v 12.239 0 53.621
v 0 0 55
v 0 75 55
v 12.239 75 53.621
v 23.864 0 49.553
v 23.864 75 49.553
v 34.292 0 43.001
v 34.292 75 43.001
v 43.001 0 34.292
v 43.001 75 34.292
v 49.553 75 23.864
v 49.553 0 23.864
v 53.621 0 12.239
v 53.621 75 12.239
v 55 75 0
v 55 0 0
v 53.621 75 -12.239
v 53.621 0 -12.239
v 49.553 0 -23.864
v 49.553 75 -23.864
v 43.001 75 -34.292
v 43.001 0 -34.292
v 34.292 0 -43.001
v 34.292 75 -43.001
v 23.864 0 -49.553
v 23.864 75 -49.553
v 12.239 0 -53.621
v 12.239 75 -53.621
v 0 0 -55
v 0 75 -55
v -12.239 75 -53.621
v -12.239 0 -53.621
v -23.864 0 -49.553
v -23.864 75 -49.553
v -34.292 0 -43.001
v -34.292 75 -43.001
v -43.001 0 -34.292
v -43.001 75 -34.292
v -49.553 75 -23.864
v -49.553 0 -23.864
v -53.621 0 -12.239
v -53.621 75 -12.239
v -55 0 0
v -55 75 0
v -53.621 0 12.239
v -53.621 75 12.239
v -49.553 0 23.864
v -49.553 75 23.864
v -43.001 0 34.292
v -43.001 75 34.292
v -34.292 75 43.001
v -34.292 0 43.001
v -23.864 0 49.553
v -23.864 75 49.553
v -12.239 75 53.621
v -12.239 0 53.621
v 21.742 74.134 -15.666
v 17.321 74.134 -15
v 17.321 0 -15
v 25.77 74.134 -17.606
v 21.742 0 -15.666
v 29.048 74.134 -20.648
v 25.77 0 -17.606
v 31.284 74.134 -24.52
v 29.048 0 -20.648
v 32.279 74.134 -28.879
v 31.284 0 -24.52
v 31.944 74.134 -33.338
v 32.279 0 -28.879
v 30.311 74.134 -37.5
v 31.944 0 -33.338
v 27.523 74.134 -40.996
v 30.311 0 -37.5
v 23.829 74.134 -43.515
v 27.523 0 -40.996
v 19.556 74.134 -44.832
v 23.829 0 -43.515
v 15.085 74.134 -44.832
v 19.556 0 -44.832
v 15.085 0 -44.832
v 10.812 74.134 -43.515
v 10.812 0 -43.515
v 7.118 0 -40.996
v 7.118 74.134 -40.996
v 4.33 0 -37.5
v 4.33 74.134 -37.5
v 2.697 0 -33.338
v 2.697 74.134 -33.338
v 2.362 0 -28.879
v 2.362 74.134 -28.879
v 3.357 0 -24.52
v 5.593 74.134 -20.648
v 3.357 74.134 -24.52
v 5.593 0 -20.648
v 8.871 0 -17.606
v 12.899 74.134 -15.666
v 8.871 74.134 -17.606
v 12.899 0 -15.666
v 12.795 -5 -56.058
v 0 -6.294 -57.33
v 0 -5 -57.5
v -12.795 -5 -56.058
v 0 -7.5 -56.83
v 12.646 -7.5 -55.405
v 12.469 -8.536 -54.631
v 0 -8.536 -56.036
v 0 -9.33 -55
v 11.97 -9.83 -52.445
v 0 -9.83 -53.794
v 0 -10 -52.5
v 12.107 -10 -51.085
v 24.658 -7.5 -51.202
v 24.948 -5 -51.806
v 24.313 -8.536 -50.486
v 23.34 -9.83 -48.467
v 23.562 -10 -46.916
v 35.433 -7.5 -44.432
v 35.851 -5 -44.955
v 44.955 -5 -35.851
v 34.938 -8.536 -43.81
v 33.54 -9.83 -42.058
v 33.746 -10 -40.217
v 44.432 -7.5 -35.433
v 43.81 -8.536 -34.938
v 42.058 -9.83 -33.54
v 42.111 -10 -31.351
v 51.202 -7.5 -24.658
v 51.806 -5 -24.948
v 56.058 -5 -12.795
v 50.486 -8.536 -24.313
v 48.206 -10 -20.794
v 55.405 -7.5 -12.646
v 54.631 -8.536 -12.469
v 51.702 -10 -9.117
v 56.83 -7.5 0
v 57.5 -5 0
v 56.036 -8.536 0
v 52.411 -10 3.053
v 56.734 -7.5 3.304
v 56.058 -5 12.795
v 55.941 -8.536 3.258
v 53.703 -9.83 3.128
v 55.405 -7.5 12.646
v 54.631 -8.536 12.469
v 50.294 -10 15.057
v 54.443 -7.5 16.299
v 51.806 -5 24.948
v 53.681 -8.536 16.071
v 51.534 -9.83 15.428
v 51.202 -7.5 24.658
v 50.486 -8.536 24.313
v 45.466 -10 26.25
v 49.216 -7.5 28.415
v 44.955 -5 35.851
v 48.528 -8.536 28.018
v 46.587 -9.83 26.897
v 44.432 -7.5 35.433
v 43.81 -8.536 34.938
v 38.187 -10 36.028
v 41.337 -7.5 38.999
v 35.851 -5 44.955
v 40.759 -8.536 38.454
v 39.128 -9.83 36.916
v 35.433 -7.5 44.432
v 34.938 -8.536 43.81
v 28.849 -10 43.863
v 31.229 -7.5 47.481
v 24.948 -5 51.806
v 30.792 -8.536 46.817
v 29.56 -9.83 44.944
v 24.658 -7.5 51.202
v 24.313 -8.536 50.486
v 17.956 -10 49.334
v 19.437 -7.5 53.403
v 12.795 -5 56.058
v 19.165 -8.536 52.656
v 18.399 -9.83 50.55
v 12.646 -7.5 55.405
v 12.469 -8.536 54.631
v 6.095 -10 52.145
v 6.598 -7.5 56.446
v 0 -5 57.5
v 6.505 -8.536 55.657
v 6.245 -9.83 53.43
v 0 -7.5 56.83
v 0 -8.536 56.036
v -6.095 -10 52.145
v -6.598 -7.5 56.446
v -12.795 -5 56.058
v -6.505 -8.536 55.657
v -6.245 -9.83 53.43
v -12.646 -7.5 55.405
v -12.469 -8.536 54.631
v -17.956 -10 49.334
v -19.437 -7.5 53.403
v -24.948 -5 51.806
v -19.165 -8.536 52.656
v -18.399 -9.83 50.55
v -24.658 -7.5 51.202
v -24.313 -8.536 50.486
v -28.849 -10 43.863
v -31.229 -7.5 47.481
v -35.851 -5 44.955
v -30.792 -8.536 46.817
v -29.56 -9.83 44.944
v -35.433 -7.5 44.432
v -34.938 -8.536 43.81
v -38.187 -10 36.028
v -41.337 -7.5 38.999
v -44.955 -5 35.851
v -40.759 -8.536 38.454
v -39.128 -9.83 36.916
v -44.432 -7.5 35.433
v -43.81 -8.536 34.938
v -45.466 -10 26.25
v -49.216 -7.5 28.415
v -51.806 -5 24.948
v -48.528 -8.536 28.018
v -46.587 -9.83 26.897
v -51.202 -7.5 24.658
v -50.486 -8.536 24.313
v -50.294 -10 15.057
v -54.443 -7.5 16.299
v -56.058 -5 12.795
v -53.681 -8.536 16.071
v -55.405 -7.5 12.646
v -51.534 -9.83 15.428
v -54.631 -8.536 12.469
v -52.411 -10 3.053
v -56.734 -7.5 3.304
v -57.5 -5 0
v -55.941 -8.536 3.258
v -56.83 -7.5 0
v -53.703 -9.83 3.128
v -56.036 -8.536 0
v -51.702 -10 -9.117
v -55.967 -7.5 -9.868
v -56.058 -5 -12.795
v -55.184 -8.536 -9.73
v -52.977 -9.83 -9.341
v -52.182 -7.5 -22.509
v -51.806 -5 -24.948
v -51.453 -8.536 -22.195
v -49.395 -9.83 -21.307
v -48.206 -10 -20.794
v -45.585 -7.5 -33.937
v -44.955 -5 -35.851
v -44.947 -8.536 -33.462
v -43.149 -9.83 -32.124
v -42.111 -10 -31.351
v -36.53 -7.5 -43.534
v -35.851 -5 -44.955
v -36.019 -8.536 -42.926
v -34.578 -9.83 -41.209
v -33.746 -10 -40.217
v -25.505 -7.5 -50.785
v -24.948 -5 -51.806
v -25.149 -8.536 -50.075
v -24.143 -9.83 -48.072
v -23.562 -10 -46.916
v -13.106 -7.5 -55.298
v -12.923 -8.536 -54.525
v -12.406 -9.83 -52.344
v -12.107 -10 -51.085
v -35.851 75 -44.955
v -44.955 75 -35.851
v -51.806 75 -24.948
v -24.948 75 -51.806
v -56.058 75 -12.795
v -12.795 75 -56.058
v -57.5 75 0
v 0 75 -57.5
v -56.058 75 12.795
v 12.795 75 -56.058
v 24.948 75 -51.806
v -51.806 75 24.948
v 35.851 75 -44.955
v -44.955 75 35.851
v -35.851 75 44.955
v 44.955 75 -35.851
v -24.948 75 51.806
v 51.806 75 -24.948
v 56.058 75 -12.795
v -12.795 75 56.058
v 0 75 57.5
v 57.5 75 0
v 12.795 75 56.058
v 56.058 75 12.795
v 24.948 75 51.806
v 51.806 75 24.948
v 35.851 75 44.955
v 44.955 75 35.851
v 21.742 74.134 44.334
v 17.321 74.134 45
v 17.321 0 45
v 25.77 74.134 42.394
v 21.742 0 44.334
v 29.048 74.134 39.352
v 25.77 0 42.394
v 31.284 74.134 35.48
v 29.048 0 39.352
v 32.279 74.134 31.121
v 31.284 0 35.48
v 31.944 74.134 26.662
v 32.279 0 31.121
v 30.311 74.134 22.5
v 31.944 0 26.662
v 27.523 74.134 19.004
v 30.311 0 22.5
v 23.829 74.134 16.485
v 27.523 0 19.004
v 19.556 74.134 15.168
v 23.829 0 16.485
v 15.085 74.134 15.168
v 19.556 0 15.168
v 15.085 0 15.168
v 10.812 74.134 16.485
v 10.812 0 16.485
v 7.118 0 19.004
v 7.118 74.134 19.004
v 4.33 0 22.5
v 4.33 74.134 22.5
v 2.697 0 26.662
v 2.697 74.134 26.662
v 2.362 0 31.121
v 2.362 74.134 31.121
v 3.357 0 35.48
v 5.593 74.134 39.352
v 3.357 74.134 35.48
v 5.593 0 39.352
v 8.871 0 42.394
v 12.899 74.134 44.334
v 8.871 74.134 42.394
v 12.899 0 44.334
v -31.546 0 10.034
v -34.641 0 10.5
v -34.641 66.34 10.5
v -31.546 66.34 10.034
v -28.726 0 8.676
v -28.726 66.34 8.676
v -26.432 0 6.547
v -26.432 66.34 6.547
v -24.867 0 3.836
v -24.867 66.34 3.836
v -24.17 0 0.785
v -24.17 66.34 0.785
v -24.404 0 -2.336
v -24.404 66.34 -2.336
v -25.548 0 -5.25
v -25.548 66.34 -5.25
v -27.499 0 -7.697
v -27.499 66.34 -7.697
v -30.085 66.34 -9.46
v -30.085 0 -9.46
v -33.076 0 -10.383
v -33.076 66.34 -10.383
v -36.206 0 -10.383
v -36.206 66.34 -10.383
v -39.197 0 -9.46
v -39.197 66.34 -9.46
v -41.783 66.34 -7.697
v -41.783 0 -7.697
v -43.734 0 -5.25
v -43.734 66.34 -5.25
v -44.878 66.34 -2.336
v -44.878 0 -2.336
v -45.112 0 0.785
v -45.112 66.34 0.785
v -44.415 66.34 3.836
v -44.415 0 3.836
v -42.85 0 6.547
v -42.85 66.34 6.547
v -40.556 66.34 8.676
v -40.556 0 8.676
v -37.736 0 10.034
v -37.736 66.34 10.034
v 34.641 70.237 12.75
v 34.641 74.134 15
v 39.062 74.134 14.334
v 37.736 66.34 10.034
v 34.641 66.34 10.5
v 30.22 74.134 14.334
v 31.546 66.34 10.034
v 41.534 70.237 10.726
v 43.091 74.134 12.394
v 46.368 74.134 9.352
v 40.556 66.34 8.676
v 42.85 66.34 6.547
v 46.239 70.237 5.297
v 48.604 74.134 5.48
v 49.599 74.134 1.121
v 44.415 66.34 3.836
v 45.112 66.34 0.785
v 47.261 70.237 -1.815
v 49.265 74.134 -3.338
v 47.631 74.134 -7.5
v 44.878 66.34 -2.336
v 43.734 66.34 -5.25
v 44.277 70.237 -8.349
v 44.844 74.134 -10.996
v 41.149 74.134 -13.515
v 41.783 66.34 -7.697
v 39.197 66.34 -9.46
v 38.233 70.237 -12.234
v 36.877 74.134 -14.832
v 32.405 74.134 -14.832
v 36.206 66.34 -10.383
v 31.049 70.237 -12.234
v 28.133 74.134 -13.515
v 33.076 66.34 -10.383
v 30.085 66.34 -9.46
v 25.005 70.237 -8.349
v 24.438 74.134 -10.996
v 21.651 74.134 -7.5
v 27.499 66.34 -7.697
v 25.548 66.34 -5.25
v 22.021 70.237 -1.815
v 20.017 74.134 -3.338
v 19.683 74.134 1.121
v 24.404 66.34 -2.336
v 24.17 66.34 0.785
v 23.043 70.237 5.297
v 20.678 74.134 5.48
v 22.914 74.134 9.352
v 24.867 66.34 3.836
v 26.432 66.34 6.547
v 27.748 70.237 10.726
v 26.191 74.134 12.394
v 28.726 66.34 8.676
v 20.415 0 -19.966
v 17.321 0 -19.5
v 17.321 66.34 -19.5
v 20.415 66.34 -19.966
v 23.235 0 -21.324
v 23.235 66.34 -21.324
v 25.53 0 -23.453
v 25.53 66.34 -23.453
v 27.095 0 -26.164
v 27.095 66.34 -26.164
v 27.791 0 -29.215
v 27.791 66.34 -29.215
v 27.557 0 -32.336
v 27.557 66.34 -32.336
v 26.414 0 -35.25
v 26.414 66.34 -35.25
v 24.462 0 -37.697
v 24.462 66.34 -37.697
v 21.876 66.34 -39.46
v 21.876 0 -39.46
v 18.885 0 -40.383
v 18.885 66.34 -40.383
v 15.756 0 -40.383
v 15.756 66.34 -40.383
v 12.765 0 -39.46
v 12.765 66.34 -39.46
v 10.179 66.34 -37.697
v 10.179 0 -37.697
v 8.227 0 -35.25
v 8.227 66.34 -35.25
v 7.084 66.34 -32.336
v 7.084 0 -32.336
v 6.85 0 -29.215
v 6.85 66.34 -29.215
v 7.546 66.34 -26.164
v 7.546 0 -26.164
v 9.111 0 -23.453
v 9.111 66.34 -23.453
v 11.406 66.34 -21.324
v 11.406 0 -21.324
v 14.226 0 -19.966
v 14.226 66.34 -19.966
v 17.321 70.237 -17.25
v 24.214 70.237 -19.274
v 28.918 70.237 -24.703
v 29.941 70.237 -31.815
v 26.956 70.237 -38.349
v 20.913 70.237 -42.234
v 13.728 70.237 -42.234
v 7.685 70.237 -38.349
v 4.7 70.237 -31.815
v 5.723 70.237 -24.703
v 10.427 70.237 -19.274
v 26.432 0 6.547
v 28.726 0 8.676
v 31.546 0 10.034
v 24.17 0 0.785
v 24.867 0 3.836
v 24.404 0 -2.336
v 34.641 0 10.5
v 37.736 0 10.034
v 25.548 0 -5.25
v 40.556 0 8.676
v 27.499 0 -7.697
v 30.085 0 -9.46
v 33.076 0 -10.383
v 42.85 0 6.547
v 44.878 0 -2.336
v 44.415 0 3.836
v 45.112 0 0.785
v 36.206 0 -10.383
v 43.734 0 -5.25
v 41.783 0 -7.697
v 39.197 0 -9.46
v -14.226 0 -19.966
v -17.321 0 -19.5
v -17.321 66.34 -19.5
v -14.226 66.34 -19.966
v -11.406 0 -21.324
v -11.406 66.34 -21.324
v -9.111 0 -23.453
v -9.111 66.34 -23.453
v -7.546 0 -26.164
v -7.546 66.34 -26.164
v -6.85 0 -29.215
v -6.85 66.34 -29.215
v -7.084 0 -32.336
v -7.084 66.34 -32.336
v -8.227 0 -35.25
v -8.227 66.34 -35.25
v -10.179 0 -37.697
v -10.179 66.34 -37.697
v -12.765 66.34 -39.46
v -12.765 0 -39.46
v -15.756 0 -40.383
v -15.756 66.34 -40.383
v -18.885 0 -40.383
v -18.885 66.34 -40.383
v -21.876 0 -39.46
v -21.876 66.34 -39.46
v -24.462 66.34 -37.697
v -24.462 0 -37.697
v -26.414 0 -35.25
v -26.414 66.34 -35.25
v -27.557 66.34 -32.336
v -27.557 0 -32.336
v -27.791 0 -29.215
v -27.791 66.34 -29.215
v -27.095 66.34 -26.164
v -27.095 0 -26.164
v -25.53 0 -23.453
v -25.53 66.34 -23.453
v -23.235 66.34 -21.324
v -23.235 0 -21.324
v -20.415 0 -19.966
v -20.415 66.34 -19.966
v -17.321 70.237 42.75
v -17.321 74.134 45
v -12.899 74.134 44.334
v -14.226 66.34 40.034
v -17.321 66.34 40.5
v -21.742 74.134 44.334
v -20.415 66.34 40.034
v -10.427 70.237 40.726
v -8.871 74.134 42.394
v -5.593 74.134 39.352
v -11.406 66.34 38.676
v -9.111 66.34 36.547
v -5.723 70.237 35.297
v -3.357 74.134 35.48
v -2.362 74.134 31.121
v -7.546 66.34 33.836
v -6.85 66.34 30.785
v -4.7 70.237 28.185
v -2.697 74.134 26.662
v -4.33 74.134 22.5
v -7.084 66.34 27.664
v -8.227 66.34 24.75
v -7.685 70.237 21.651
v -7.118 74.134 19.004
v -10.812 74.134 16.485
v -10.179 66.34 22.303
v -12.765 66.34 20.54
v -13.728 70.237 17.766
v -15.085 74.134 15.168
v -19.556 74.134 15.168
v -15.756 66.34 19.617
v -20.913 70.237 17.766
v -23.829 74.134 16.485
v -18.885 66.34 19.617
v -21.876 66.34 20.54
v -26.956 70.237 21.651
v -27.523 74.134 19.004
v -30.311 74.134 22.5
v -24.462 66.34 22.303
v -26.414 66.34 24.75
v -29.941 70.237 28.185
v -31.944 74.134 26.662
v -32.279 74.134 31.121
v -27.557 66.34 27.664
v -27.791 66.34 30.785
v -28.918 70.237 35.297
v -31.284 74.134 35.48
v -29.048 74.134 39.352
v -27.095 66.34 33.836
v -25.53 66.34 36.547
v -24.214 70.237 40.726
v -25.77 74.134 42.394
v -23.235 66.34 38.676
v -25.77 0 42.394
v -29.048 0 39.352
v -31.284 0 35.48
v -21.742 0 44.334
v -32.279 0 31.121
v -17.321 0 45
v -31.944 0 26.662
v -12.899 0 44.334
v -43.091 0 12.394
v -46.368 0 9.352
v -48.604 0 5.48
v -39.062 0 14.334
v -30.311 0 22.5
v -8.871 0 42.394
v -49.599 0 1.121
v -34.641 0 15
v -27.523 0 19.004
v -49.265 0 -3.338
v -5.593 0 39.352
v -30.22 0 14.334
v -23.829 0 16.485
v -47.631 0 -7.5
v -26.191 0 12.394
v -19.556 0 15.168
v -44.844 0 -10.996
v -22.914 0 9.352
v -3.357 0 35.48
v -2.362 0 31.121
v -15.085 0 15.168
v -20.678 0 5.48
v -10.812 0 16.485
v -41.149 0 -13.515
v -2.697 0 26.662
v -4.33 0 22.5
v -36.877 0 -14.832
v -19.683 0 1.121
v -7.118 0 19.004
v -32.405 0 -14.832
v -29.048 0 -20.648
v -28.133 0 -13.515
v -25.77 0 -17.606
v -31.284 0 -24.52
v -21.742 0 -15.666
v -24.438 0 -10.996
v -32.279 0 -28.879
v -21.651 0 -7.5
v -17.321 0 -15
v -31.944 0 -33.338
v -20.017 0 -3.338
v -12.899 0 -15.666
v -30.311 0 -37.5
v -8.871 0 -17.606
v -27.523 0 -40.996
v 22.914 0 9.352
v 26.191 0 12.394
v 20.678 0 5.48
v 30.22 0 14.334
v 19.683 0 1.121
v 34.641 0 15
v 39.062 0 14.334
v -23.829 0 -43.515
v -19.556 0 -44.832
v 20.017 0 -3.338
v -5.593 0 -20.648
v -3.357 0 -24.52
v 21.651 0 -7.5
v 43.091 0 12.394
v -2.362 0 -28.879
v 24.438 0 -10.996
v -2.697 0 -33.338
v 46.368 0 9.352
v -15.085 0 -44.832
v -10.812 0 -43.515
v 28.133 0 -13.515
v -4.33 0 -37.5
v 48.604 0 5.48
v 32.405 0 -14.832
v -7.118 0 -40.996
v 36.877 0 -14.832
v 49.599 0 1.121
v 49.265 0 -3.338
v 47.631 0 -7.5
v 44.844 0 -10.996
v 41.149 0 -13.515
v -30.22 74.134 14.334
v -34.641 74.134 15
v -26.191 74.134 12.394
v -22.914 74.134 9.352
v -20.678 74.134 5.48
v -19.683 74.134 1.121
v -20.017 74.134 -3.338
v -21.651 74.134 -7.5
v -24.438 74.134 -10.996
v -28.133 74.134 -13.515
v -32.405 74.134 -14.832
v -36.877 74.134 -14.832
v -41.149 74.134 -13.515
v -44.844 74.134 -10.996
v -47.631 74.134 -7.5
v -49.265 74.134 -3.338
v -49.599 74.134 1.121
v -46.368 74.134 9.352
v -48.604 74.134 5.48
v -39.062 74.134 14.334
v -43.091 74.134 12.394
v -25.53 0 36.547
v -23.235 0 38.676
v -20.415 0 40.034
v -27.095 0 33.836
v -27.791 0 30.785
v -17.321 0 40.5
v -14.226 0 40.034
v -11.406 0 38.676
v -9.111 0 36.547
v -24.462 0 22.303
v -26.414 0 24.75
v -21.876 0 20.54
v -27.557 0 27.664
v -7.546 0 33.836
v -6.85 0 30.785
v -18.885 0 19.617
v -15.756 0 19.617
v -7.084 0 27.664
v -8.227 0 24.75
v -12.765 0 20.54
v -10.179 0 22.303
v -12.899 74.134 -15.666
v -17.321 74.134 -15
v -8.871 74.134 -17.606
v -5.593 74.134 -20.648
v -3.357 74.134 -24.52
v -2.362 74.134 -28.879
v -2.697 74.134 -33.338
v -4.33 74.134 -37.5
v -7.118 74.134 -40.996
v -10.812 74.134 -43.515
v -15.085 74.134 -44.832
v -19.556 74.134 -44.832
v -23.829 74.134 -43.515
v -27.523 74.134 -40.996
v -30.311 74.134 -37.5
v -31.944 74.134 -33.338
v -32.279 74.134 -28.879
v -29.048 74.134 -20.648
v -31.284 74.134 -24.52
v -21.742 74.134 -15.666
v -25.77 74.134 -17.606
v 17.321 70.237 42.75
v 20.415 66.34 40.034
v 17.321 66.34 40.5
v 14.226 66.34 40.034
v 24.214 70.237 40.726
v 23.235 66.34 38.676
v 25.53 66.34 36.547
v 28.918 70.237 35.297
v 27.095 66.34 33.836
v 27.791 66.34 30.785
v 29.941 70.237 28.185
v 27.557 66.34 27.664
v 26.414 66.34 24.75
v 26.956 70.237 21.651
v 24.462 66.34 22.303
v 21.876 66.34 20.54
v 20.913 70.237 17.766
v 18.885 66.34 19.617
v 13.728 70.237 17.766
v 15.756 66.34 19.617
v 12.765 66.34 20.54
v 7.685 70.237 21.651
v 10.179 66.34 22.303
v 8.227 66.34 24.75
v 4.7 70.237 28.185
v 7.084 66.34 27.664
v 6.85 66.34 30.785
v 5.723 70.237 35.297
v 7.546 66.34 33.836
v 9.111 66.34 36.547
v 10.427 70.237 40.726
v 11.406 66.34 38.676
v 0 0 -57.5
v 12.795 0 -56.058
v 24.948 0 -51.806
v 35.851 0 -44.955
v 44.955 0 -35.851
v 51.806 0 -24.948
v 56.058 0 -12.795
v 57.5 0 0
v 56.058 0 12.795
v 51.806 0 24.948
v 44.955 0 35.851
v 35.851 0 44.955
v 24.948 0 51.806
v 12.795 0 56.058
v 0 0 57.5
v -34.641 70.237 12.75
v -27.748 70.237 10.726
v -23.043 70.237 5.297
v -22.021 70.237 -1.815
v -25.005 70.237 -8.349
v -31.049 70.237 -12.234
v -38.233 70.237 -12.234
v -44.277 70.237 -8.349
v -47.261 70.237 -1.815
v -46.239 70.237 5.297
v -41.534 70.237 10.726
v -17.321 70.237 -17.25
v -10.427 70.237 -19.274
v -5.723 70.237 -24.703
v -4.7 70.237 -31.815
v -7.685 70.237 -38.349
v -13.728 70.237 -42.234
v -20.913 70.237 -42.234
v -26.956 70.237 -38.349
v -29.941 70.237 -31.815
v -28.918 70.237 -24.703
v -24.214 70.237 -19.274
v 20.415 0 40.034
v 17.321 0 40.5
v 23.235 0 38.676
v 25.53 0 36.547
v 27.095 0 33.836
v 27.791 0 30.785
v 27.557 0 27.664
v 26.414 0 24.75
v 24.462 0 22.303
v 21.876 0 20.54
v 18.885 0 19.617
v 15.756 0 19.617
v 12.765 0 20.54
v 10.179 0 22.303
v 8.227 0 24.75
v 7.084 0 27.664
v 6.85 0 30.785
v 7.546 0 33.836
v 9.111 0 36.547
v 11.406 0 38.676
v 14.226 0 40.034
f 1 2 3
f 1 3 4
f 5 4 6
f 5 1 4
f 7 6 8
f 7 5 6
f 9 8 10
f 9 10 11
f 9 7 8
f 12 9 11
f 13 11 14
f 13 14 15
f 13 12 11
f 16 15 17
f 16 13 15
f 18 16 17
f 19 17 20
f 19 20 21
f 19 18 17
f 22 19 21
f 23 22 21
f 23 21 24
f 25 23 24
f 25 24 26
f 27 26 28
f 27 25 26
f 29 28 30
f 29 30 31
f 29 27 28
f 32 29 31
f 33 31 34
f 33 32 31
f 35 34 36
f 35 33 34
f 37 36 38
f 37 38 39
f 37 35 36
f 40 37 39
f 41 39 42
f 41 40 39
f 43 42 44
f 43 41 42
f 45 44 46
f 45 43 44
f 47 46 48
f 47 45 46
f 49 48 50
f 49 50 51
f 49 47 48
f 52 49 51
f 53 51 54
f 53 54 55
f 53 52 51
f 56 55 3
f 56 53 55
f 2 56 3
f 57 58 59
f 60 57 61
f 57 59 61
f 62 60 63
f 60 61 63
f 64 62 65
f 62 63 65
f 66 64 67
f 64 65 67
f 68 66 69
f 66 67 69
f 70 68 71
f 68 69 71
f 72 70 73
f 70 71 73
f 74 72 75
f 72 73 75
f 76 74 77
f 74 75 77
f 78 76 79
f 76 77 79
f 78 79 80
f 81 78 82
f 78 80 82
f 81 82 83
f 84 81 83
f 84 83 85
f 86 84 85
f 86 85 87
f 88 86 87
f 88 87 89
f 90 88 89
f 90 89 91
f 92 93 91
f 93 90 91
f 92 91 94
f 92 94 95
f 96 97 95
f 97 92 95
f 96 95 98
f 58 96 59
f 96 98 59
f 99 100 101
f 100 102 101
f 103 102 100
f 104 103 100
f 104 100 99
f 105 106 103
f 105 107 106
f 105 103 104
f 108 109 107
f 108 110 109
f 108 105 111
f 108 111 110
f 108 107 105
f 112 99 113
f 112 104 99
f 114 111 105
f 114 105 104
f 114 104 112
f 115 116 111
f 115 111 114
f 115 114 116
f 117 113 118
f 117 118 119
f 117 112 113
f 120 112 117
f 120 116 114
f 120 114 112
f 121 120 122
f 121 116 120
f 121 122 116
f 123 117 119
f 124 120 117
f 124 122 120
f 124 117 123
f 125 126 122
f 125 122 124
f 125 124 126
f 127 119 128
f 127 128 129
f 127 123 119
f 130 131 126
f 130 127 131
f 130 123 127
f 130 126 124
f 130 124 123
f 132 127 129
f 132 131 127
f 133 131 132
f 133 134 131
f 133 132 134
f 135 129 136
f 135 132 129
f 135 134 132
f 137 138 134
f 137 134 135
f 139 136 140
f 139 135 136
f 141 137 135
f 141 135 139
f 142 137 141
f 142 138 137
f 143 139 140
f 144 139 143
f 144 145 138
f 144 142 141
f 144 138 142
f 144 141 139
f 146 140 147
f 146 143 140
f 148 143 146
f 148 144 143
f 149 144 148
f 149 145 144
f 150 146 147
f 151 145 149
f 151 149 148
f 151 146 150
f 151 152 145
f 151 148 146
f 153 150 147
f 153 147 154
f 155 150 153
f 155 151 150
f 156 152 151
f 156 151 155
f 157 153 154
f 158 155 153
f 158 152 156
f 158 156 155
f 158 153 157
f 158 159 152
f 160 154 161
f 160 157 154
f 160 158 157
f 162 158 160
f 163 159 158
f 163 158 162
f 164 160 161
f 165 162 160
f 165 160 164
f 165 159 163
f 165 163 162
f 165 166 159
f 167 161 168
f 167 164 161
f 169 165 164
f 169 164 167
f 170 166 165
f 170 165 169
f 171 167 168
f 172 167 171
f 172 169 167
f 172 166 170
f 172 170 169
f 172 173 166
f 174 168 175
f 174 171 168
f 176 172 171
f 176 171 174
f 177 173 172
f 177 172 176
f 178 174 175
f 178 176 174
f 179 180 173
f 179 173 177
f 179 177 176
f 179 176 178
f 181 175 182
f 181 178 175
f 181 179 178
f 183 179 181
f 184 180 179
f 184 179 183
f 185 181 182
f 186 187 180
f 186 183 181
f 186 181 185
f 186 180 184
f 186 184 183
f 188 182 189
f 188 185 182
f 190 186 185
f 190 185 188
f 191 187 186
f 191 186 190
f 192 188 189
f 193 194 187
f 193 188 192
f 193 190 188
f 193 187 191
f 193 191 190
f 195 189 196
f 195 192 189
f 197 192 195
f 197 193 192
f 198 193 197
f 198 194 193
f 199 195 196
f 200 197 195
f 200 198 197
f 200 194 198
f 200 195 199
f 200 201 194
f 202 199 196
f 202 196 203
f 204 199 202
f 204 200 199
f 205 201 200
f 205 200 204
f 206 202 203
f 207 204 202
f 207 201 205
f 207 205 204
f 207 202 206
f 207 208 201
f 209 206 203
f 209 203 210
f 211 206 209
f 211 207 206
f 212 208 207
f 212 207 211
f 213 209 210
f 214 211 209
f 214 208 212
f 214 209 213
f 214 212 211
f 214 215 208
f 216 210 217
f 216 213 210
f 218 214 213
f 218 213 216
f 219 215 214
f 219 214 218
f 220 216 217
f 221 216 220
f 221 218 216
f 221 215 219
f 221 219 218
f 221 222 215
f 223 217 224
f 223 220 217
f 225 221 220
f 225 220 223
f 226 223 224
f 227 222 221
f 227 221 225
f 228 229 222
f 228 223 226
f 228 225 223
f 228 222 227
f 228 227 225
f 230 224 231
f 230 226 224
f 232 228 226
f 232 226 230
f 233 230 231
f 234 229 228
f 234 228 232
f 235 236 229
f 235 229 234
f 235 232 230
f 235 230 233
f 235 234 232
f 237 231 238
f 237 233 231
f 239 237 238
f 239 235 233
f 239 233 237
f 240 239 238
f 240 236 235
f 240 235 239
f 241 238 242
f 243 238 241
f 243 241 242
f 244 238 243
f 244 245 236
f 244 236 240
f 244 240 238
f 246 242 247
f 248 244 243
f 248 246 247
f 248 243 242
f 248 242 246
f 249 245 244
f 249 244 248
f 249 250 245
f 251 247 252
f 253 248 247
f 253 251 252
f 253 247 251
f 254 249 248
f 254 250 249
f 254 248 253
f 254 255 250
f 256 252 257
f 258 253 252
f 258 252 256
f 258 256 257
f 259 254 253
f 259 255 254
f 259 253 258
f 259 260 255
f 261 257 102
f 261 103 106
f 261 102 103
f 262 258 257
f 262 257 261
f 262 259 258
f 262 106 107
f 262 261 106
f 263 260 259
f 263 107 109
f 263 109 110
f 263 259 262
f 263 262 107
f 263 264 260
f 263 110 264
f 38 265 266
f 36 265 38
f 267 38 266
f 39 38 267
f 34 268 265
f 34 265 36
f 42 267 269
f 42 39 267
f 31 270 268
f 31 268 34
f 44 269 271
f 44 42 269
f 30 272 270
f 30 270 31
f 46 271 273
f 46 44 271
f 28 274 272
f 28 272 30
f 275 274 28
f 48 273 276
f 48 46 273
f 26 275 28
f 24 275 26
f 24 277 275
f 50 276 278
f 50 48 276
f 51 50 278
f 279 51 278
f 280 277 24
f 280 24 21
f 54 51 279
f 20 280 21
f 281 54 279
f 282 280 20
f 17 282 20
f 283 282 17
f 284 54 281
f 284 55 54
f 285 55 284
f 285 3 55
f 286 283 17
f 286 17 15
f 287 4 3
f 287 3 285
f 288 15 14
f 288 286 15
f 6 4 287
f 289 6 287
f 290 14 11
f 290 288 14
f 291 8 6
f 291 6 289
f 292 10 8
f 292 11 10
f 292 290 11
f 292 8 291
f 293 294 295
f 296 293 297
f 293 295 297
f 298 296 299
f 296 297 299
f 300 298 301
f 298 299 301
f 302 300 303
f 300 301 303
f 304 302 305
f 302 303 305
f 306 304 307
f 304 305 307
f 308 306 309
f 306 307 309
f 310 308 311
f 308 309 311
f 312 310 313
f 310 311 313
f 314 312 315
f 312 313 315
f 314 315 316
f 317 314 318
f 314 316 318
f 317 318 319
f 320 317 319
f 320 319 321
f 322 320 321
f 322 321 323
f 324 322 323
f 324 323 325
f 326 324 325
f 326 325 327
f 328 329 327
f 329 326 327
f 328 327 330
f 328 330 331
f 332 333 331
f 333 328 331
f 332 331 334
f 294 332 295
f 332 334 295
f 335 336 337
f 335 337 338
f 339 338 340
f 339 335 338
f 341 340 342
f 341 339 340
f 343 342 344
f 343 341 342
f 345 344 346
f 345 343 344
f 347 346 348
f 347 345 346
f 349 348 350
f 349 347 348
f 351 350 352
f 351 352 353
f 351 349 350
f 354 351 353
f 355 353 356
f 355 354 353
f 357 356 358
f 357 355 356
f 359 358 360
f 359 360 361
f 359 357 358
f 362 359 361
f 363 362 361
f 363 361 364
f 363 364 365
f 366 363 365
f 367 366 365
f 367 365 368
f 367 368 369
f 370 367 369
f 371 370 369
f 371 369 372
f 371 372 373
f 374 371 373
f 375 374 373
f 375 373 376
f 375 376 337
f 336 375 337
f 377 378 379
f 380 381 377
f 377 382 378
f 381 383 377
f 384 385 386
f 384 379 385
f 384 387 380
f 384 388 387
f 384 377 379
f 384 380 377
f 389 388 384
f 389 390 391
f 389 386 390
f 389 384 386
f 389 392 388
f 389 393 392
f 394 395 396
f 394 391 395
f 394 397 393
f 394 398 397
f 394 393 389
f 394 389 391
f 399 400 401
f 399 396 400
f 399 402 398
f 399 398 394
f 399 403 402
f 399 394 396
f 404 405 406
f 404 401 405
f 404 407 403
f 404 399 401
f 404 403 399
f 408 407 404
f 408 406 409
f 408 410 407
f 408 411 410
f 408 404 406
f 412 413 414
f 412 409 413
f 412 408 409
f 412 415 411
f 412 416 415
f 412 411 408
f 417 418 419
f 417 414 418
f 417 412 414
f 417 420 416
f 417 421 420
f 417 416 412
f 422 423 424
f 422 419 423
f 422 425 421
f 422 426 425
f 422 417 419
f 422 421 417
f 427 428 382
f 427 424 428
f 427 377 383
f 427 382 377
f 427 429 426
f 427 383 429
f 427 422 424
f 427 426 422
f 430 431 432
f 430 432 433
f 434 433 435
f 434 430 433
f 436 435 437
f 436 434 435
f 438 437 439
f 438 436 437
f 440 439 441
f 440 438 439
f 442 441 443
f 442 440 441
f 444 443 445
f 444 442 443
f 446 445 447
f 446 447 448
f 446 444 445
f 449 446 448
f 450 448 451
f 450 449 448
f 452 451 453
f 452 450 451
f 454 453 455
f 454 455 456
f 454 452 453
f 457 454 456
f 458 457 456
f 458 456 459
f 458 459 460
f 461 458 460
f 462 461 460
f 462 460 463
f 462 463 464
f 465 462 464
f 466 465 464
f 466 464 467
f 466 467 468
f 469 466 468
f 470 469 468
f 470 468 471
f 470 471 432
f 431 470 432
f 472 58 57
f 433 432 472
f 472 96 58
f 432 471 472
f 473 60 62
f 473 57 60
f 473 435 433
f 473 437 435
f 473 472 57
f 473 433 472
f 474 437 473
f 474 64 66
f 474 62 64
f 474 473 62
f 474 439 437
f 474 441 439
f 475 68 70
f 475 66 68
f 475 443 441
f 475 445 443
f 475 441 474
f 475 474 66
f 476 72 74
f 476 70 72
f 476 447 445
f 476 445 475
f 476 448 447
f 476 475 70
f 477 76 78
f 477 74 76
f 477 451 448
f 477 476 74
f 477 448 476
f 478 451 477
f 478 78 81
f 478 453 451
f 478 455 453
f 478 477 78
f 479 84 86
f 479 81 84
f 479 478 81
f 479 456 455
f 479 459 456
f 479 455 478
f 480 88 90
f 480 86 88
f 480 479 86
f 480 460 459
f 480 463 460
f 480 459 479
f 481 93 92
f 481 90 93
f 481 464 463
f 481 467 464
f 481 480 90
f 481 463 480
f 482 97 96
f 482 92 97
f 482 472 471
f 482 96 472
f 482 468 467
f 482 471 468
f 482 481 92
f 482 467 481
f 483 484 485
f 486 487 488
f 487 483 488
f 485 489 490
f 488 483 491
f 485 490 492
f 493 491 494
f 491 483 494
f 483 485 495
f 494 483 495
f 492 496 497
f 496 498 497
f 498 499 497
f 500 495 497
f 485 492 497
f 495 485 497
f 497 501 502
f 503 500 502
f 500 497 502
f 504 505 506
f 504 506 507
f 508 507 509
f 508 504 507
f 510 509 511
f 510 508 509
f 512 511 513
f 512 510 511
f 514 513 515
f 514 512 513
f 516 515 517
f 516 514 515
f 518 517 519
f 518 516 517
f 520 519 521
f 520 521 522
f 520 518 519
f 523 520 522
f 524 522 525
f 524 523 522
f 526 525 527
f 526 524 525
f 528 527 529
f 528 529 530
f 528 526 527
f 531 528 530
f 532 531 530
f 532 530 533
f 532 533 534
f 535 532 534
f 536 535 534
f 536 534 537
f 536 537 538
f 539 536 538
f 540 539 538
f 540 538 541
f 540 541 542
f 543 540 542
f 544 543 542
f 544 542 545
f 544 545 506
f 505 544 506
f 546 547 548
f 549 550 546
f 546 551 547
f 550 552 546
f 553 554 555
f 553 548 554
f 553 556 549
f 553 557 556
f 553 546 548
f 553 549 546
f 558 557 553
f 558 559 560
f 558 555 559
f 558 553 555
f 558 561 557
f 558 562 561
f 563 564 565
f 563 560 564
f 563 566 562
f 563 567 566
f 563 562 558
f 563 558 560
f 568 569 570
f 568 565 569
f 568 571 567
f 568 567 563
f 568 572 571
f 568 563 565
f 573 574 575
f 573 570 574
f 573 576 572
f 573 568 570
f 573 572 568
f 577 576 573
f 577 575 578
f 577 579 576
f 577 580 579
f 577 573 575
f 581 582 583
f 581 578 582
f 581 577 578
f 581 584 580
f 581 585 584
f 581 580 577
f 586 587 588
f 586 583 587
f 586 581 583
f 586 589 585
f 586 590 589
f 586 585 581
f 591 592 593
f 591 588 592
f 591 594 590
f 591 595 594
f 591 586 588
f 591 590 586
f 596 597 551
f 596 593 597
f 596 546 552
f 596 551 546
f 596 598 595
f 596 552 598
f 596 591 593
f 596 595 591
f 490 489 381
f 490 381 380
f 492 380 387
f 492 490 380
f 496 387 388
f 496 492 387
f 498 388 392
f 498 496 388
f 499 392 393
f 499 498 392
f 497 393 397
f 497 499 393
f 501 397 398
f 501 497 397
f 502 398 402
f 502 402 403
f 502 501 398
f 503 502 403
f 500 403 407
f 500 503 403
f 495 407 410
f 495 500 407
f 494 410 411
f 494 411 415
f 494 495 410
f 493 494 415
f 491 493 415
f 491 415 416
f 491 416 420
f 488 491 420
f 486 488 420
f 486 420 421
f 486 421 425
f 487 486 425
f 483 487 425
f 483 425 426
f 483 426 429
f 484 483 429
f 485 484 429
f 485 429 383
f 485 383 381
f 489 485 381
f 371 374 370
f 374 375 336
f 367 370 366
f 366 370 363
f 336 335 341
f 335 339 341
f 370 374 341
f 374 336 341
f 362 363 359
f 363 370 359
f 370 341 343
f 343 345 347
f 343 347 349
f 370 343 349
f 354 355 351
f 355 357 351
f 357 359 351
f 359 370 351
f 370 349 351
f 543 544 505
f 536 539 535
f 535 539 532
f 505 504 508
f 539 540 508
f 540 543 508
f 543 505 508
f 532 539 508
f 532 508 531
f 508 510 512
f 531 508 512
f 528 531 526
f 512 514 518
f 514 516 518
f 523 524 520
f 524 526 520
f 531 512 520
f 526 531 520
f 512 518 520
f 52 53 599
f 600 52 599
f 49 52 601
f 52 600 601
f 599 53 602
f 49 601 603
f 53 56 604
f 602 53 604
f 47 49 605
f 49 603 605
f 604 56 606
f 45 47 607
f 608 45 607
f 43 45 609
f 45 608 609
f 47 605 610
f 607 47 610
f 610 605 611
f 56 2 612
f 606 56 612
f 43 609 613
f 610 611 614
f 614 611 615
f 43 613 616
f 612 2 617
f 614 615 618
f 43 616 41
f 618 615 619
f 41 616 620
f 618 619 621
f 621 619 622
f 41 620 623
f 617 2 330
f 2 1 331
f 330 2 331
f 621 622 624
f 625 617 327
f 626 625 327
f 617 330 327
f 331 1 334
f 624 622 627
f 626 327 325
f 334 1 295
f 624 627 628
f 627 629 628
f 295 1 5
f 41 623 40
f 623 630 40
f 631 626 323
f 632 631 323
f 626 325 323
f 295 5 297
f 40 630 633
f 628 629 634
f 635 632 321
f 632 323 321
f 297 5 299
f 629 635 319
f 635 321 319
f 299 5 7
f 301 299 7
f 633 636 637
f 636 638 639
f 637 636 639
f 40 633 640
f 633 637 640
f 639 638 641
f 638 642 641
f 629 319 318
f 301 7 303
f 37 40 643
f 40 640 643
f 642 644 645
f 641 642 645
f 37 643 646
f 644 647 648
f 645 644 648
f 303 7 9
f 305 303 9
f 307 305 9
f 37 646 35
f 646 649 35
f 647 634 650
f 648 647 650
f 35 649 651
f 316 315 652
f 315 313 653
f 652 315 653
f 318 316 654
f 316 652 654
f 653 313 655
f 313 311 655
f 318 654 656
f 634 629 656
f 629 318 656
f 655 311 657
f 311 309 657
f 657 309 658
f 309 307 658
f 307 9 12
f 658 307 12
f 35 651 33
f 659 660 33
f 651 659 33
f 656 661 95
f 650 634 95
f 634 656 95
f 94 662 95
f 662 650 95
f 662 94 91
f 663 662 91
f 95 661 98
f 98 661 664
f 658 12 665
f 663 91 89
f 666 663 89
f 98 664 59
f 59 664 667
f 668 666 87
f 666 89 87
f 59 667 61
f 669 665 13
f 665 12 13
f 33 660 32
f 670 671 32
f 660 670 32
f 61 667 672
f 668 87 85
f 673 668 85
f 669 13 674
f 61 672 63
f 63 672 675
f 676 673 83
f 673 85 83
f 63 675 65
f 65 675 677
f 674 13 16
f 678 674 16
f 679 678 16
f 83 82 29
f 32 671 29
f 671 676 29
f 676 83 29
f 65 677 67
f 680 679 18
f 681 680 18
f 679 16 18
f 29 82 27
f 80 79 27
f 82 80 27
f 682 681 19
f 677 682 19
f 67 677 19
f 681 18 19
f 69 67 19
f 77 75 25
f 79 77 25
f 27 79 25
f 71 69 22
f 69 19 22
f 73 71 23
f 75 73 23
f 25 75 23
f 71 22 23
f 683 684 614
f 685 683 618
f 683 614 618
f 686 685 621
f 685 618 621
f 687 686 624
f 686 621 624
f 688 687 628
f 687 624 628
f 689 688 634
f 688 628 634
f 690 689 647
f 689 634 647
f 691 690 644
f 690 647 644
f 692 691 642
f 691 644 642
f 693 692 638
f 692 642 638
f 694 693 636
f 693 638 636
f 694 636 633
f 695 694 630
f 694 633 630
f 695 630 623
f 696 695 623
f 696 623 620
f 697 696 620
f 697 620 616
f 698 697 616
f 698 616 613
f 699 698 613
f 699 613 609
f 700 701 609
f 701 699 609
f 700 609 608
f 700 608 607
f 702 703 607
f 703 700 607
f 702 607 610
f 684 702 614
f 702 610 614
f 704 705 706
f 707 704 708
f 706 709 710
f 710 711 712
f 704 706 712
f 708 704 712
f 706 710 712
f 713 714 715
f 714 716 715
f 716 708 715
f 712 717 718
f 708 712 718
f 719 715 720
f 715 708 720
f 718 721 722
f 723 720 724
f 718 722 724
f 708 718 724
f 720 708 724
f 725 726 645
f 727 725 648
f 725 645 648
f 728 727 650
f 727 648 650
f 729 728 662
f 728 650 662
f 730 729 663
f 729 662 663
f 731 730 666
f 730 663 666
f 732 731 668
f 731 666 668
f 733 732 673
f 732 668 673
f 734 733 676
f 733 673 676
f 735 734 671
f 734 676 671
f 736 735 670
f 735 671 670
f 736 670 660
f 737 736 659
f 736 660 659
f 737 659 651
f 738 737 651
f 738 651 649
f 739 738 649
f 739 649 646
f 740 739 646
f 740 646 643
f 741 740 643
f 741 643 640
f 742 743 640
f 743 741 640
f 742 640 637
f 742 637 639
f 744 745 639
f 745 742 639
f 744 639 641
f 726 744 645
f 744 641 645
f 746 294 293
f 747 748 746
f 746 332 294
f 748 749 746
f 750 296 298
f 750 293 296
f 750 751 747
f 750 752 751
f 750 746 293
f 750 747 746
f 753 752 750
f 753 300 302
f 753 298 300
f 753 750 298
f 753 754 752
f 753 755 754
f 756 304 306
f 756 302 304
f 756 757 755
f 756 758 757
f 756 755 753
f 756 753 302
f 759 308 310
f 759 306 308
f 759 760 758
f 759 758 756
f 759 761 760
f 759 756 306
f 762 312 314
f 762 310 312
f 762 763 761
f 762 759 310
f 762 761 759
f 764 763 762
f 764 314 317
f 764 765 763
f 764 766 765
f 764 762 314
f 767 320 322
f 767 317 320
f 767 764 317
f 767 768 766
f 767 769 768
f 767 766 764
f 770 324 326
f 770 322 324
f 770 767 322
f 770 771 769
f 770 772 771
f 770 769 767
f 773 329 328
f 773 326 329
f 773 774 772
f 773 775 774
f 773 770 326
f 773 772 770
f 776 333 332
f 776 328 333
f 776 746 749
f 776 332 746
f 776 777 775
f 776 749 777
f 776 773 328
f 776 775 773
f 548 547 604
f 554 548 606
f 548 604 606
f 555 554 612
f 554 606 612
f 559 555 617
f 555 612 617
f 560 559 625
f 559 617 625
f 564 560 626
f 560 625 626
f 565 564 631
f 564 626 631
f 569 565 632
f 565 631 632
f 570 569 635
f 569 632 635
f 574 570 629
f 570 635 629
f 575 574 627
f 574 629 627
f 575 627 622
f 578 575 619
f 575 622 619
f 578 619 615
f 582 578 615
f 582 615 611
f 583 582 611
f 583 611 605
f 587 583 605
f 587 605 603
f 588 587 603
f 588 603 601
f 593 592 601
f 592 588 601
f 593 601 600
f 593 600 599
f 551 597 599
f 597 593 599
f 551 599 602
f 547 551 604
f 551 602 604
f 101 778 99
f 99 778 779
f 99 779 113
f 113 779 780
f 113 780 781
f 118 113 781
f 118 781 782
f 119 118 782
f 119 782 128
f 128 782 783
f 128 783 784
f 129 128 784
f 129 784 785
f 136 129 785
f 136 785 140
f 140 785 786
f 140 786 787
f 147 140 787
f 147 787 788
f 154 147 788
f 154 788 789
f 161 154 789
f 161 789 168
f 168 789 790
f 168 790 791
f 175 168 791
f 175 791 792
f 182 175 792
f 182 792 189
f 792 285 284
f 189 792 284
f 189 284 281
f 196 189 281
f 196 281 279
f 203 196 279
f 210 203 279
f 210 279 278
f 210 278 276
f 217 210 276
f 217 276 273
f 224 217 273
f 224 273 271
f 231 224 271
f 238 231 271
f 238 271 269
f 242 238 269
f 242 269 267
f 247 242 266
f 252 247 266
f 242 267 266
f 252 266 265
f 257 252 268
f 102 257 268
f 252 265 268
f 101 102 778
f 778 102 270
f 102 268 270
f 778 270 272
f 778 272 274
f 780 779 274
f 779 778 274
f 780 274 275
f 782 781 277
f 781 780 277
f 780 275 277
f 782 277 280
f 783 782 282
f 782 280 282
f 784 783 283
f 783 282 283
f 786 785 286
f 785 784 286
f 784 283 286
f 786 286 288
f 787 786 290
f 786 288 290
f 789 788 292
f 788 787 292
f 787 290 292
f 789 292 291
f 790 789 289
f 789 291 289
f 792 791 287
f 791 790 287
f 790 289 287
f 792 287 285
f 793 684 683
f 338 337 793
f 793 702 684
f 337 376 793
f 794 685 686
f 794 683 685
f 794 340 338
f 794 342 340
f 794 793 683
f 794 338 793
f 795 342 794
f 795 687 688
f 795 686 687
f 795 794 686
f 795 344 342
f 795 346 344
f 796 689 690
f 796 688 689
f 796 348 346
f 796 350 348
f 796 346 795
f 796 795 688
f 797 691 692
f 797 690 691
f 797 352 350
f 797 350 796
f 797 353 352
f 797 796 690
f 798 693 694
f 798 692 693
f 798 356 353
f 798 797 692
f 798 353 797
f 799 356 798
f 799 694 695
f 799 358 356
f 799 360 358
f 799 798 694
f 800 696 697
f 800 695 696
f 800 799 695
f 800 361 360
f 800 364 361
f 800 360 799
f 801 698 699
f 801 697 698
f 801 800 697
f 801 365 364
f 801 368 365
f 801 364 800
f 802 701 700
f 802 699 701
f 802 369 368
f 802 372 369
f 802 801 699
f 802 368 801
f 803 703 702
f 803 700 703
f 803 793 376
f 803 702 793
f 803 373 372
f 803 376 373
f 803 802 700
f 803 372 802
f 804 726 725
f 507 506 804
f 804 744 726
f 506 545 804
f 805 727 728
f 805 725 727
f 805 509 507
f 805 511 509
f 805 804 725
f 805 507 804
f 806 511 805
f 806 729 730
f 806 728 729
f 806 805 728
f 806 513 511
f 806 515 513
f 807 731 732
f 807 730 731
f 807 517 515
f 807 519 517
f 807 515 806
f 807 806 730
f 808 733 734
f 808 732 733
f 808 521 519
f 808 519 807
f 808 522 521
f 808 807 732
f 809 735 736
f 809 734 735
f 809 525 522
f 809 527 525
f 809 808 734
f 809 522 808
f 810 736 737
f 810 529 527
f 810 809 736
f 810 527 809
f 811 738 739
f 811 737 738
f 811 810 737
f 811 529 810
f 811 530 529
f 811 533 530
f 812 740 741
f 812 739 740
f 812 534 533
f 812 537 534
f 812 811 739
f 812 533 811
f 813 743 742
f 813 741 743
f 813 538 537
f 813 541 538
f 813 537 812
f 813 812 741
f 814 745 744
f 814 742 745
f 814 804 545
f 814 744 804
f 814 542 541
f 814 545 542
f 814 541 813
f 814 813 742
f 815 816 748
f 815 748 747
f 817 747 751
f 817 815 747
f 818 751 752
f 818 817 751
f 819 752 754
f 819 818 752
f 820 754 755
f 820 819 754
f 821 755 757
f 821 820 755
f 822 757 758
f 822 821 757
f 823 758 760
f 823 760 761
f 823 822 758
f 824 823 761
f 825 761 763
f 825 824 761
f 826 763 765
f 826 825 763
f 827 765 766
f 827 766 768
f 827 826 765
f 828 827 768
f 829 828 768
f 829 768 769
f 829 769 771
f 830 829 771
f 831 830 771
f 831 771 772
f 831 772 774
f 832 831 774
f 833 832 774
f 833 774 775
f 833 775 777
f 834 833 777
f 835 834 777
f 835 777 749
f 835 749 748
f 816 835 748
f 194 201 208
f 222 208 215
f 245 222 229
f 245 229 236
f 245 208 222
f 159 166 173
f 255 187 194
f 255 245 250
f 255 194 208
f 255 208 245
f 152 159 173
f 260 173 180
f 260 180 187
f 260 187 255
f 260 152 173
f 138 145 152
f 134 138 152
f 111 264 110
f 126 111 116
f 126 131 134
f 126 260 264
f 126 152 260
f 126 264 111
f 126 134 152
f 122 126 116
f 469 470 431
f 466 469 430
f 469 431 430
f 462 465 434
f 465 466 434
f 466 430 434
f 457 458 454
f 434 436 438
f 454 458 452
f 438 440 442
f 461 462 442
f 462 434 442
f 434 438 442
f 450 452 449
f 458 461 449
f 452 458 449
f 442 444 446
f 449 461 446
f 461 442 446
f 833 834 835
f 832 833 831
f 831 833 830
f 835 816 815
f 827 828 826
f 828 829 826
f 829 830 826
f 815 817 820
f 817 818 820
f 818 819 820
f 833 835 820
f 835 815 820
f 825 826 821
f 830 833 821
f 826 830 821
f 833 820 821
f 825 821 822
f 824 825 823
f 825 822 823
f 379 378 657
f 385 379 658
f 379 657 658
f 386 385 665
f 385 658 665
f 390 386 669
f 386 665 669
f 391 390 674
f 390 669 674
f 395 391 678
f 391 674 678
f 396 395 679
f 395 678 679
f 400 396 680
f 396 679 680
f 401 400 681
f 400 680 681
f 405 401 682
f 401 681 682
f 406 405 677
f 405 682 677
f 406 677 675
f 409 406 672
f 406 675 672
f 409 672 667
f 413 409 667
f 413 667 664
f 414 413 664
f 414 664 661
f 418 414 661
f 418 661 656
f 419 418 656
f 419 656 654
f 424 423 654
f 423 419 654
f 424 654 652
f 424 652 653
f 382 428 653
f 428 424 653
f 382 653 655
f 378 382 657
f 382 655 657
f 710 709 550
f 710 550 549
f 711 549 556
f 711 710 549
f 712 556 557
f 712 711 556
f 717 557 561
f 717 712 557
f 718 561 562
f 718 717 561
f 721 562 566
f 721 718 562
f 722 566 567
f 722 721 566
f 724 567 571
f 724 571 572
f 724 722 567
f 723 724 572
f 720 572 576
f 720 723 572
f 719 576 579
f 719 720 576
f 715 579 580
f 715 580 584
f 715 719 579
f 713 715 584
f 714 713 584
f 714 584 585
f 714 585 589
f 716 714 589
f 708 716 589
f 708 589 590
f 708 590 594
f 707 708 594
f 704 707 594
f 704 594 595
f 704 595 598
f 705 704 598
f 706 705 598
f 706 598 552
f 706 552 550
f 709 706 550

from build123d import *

# Parameters (mm, degrees)
SKETCH2_R             = 15
SKETCH2_R_2           = 10.5
BOSS_EXTRUDE1_DEPTH   = 75
BOSS_EXTRUDE1_2_DEPTH = 75
BOSS_EXTRUDE1_3_DEPTH = 75
BOSS_EXTRUDE1_4_DEPTH = 75
BOSS_EXTRUDE1_5_DEPTH = 75
BOSS_EXTRUDE1_6_DEPTH = 75
SKETCH2_R_3           = 57.5
SKETCH2_R_4           = 55
BOSS_EXTRUDE1_7_DEPTH = 75
SKETCH3_R             = 57.5
BOSS_EXTRUDE2_DEPTH   = 10
CHAMFER2_SIZE         = 5
CHAMFER2_SIZE_2       = 8.660254038
FILLET1_R             = 5


with BuildPart() as part:
    # Sketch2 → Boss-Extrude1 (new body)
    with BuildSketch(Plane(origin=(0, 0, 0), x_dir=(1, 0, 0), z_dir=(0, 1, 0))):
        with Locations(Location((-34.641016151, 0, 0), (0, 0, 270))):
            Circle(SKETCH2_R)
        with Locations(Location((-34.641016151, 0, 0), (0, 0, 270))):
            Circle(SKETCH2_R_2, mode=Mode.SUBTRACT)
    extrude(amount=BOSS_EXTRUDE1_DEPTH)



with BuildPart() as body_2:
    # Sketch2 → Boss-Extrude1 2 (new body)
    with BuildSketch(Plane(origin=(0, 0, 0), x_dir=(1, 0, 0), z_dir=(0, 1, 0))):
        with Locations(Location((-17.320508076, 30, 0), (0, 0, 270))):
            Circle(SKETCH2_R)
        with Locations(Location((-17.320508076, 30, 0), (0, 0, 270))):
            Circle(SKETCH2_R_2, mode=Mode.SUBTRACT)
    extrude(amount=BOSS_EXTRUDE1_2_DEPTH)


with BuildPart() as body_3:
    # Sketch2 → Boss-Extrude1 3 (new body)
    with BuildSketch(Plane(origin=(0, 0, 0), x_dir=(1, 0, 0), z_dir=(0, 1, 0))):
        with Locations(Location((17.320508076, 30, 0), (0, 0, 270))):
            Circle(SKETCH2_R)
        with Locations(Location((17.320508076, 30, 0), (0, 0, 270))):
            Circle(SKETCH2_R_2, mode=Mode.SUBTRACT)
    extrude(amount=BOSS_EXTRUDE1_3_DEPTH)


with BuildPart() as body_4:
    # Sketch2 → Boss-Extrude1 4 (new body)
    with BuildSketch(Plane(origin=(0, 0, 0), x_dir=(1, 0, 0), z_dir=(0, 1, 0))):
        with Locations(Location((34.641016151, 0, 0), (0, 0, 270))):
            Circle(SKETCH2_R)
        with Locations(Location((34.641016151, 0, 0), (0, 0, 270))):
            Circle(SKETCH2_R_2, mode=Mode.SUBTRACT)
    extrude(amount=BOSS_EXTRUDE1_4_DEPTH)


with BuildPart() as body_5:
    # Sketch2 → Boss-Extrude1 5 (new body)
    with BuildSketch(Plane(origin=(0, 0, 0), x_dir=(1, 0, 0), z_dir=(0, 1, 0))):
        with Locations(Location((17.320508076, -30, 0), (0, 0, 270))):
            Circle(SKETCH2_R)
        with Locations(Location((17.320508076, -30, 0), (0, 0, 270))):
            Circle(SKETCH2_R_2, mode=Mode.SUBTRACT)
    extrude(amount=BOSS_EXTRUDE1_5_DEPTH)


with BuildPart() as body_6:
    # Sketch2 → Boss-Extrude1 6 (new body)
    with BuildSketch(Plane(origin=(0, 0, 0), x_dir=(1, 0, 0), z_dir=(0, 1, 0))):
        with Locations(Location((-17.320508076, -30, 0), (0, 0, 270))):
            Circle(SKETCH2_R)
        with Locations(Location((-17.320508076, -30, 0), (0, 0, 270))):
            Circle(SKETCH2_R_2, mode=Mode.SUBTRACT)
    extrude(amount=BOSS_EXTRUDE1_6_DEPTH)


with BuildPart() as body_7:
    # Sketch2 → Boss-Extrude1 7 (new body)
    with BuildSketch(Plane(origin=(0, 0, 0), x_dir=(1, 0, 0), z_dir=(0, 1, 0))):
        with Locations(Location((0, 0, 0), (0, 0, 270))):
            Circle(SKETCH2_R_3)
        with Locations(Location((0, 0, 0), (0, 0, 270))):
            Circle(SKETCH2_R_4, mode=Mode.SUBTRACT)
    extrude(amount=BOSS_EXTRUDE1_7_DEPTH)


with BuildPart() as part_1:
    add(part.part)

    add(body_2.part)  # Boss-Extrude2 merges body 2

    add(body_3.part)  # Boss-Extrude2 merges body 3

    add(body_4.part)  # Boss-Extrude2 merges body 4

    add(body_5.part)  # Boss-Extrude2 merges body 5

    add(body_6.part)  # Boss-Extrude2 merges body 6

    add(body_7.part)  # Boss-Extrude2 merges body 7
    # Sketch3 → Boss-Extrude2 (add)
    with BuildSketch(Plane.XZ):
        with Locations(Location((0, 0, 0), (0, 0, 270))):
            Circle(SKETCH3_R)
    extrude(amount=BOSS_EXTRUDE2_DEPTH)

    # Chamfer2
    # the kernel refuses this chamfer: 8.660254038, 5 mm, written as the material it takes off along each edge
    with BuildSketch(Plane(origin=(-17.320508076, 75, -30), x_dir=(0, 0, 1), z_dir=(-1, 0, 0))) as chamfer2_piece_1:
        Polygon((10.5 + CHAMFER2_SIZE, 0), (10.5, -CHAMFER2_SIZE_2), (10.5, 0), align=None)
    revolve(axis=Axis((-17.320508076, 75, -30), (0, 1, 0)), mode=Mode.SUBTRACT)
    with BuildSketch(Plane(origin=(-34.641016151, 75, 0), x_dir=(0, 0, 1), z_dir=(-1, 0, 0))) as chamfer2_piece_2:
        Polygon((10.5 + CHAMFER2_SIZE, 0), (10.5, -CHAMFER2_SIZE_2), (10.5, 0), align=None)
    revolve(axis=Axis((-34.641016151, 75, 0), (0, 1, 0)), mode=Mode.SUBTRACT)
    with BuildSketch(Plane(origin=(-17.320508076, 75, 30), x_dir=(0, 0, 1), z_dir=(-1, 0, 0))) as chamfer2_piece_3:
        Polygon((10.5 + CHAMFER2_SIZE, 0), (10.5, -CHAMFER2_SIZE_2), (10.5, 0), align=None)
    revolve(axis=Axis((-17.320508076, 75, 30), (0, 1, 0)), mode=Mode.SUBTRACT)
    with BuildSketch(Plane(origin=(17.320508076, 75, 30), x_dir=(0, 0, 1), z_dir=(-1, 0, 0))) as chamfer2_piece_4:
        Polygon((10.5 + CHAMFER2_SIZE, 0), (10.5, -CHAMFER2_SIZE_2), (10.5, 0), align=None)
    revolve(axis=Axis((17.320508076, 75, 30), (0, 1, 0)), mode=Mode.SUBTRACT)
    with BuildSketch(Plane(origin=(34.641016151, 75, 0), x_dir=(0, 0, 1), z_dir=(-1, 0, 0))) as chamfer2_piece_5:
        Polygon((10.5 + CHAMFER2_SIZE, 0), (10.5, -CHAMFER2_SIZE_2), (10.5, 0), align=None)
    revolve(axis=Axis((34.641016151, 75, 0), (0, 1, 0)), mode=Mode.SUBTRACT)
    with BuildSketch(Plane(origin=(17.320508076, 75, -30), x_dir=(0, 0, 1), z_dir=(-1, 0, 0))) as chamfer2_piece_6:
        Polygon((10.5 + CHAMFER2_SIZE, 0), (10.5, -CHAMFER2_SIZE_2), (10.5, 0), align=None)
    revolve(axis=Axis((17.320508076, 75, -30), (0, 1, 0)), mode=Mode.SUBTRACT)

    # Fillet1
    fillet1_edges = [part_1.edges().sort_by_distance(p)[0] for p in [
        (0, -10, 57.5),
    ]]
    fillet(fillet1_edges, radius=FILLET1_R)


solid = part_1.part
